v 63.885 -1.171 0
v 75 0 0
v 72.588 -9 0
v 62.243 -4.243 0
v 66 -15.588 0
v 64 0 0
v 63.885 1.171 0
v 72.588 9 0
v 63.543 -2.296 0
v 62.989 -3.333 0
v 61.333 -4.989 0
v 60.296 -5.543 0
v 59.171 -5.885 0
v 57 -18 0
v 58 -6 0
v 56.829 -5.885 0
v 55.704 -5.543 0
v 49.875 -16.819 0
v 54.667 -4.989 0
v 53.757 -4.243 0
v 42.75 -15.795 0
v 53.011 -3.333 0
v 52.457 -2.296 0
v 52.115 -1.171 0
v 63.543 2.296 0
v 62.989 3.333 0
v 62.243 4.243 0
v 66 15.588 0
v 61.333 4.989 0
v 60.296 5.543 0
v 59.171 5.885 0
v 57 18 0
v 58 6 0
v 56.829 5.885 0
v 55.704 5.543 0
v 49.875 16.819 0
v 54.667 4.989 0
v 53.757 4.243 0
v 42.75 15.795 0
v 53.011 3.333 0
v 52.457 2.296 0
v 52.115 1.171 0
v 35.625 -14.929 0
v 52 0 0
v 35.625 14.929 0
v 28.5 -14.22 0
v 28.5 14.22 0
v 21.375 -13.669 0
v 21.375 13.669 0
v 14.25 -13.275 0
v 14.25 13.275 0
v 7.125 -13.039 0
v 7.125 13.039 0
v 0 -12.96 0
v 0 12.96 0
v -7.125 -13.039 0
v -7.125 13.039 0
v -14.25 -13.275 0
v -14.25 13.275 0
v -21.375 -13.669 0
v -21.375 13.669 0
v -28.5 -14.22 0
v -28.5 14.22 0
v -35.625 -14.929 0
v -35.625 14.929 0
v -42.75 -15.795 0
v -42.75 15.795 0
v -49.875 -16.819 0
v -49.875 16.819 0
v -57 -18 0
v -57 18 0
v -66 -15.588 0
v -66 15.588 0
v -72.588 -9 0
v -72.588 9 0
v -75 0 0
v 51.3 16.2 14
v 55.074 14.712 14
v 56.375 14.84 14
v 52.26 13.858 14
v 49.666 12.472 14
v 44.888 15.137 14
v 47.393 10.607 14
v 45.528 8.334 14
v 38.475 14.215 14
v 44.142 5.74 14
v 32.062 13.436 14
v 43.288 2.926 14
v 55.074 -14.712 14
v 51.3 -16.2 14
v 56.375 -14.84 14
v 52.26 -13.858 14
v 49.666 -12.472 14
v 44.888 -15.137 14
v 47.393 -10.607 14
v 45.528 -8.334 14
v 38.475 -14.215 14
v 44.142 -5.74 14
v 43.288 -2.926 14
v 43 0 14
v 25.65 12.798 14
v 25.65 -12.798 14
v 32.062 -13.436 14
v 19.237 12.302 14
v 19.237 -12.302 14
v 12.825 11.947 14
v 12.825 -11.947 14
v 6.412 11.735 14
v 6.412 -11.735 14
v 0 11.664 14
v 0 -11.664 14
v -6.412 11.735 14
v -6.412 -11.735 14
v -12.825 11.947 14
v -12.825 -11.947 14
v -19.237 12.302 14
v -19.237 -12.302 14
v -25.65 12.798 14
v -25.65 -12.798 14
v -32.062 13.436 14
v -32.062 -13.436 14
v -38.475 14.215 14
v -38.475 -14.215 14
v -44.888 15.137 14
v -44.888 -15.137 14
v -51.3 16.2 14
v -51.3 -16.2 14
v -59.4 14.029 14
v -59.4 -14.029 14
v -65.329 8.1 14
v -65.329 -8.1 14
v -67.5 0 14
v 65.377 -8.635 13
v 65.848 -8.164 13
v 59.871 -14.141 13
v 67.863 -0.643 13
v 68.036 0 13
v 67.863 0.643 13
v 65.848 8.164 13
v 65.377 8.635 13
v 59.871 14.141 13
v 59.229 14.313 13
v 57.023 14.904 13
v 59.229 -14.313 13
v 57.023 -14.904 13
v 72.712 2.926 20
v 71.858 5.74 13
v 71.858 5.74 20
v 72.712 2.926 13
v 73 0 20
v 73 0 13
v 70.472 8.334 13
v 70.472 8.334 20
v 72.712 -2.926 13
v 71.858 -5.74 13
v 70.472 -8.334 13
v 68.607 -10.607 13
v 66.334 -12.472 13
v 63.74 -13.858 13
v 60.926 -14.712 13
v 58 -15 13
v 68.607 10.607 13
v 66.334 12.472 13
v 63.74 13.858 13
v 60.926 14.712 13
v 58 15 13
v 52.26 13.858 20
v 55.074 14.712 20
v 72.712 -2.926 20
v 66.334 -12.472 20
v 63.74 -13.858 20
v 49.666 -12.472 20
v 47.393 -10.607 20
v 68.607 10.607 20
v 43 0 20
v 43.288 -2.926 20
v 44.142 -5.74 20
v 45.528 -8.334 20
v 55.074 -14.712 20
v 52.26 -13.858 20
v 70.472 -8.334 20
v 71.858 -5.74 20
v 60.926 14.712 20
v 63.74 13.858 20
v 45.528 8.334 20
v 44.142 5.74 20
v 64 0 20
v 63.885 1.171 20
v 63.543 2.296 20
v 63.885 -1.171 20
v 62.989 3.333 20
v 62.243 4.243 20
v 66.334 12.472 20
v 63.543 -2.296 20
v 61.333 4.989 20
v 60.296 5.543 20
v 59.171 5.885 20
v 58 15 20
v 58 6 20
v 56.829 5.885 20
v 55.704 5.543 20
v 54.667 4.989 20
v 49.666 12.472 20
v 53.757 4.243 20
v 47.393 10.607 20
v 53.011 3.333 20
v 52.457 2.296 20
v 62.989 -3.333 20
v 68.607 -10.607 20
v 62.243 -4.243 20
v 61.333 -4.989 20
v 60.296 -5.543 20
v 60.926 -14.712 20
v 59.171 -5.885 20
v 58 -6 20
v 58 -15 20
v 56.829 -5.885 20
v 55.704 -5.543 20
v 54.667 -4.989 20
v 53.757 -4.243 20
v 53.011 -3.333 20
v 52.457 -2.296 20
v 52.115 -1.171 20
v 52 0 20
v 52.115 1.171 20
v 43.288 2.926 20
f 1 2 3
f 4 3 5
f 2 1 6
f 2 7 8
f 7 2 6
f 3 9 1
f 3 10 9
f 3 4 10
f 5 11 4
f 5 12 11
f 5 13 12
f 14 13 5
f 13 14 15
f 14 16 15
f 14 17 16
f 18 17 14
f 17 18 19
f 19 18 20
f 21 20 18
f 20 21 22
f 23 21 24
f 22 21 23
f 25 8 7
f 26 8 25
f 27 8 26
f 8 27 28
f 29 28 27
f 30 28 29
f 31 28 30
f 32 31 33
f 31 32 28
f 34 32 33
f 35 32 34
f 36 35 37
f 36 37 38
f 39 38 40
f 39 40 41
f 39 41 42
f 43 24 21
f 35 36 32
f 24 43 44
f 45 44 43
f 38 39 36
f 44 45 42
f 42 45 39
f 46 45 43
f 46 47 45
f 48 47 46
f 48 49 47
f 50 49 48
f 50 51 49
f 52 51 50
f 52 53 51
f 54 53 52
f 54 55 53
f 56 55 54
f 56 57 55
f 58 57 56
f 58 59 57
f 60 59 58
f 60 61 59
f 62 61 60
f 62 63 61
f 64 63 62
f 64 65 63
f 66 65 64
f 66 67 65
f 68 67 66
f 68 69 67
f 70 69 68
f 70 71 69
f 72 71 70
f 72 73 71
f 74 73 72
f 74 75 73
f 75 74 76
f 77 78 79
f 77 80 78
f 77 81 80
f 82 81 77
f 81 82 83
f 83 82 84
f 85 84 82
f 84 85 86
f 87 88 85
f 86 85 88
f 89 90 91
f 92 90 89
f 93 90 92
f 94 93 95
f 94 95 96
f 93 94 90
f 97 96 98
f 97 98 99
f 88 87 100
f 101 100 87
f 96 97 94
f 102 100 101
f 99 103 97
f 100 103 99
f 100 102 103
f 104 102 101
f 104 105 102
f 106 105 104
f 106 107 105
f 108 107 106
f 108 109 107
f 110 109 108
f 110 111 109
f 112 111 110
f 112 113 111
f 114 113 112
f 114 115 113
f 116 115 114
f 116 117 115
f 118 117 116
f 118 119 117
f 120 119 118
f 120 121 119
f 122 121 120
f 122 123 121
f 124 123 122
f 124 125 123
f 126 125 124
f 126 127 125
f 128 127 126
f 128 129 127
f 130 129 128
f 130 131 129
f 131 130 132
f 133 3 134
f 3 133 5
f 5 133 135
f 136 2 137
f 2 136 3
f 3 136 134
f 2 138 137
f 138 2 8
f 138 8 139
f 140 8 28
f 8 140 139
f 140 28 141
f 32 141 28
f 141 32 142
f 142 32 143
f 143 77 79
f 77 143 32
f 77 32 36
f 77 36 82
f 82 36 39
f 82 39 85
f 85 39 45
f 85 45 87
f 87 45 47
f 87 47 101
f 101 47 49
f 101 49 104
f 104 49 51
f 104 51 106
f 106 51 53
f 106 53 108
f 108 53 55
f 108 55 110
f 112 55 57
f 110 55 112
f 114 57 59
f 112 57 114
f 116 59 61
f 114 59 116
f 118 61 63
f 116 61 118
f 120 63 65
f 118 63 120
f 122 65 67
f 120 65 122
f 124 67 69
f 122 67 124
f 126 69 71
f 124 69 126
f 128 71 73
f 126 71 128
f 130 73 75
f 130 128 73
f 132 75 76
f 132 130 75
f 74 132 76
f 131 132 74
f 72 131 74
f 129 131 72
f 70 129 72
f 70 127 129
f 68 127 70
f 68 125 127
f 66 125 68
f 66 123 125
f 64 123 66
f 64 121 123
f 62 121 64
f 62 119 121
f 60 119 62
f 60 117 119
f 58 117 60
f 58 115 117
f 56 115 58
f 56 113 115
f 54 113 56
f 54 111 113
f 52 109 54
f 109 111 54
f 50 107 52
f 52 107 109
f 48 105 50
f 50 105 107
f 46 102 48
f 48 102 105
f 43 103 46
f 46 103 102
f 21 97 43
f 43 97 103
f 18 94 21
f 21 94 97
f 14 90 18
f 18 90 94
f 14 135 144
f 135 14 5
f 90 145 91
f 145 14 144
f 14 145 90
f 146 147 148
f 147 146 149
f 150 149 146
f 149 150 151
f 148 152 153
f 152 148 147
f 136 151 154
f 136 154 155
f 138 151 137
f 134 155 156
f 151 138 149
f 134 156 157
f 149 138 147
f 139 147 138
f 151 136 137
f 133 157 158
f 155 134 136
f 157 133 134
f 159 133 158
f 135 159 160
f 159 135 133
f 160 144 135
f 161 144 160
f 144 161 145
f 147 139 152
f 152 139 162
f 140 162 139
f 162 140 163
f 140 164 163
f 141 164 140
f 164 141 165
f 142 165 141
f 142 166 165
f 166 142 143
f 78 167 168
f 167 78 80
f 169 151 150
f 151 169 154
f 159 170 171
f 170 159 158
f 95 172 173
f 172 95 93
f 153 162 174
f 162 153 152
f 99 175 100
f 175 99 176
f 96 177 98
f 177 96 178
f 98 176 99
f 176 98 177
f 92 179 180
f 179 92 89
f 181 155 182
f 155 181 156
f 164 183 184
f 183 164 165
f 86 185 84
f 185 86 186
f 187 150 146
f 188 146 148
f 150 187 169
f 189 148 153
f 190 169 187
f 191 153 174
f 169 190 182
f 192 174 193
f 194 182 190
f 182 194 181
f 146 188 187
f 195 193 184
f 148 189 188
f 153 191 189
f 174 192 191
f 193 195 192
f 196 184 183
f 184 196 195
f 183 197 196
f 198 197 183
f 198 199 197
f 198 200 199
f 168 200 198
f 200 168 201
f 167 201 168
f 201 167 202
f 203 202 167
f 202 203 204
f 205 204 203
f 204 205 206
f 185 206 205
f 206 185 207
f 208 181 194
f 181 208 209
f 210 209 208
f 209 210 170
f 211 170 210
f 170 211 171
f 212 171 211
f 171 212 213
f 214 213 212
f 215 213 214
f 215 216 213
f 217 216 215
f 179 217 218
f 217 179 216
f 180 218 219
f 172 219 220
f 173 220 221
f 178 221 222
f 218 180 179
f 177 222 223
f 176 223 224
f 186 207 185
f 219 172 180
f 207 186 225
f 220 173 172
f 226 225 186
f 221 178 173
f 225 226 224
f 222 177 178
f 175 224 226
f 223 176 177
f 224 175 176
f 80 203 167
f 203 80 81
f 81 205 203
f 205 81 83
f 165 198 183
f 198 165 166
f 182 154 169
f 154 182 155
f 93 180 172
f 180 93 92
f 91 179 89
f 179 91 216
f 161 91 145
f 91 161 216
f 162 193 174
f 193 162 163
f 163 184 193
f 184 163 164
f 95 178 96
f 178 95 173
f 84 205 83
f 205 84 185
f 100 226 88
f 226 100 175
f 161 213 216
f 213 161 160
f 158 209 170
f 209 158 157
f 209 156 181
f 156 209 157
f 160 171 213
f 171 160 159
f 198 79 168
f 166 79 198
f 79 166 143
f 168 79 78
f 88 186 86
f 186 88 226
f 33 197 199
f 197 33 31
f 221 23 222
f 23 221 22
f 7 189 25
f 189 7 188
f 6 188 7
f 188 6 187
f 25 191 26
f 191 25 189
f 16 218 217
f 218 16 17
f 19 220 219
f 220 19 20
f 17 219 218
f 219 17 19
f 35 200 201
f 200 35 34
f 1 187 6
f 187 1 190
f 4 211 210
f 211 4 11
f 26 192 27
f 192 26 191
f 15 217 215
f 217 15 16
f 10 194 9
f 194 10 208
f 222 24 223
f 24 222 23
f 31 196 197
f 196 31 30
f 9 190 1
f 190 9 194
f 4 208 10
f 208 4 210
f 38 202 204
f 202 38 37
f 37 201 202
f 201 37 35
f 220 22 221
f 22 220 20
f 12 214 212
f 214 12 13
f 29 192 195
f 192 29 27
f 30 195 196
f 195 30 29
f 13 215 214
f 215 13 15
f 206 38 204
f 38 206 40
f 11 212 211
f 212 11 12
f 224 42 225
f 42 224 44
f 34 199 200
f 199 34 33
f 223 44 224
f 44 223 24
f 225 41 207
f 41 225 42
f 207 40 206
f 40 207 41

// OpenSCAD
$fn = 32;

// ----------------------------------------------------------------------
// Handle: 150 x 36 mm grip, 14 mm thick
// ----------------------------------------------------------------------

// --- parameters (mm) ---
length = 150;             // grip length
width = 36;               // grip width
thickness = 14;           // grip thickness
waist = 0.72;             // width factor at the middle
draft = 0.9;              // top face scale of the extrusion
boss_d = 30;              // mounting boss diameter
boss_h = 6;               // mounting boss height
boss_hole_d = 12;         // screw clearance through the boss
boss_r = 58;              // boss centre from the grip centre

/* ergonomic grip outline, closed spline-like polygon in the XY plane */
grip = [[-57, 18], [-49.875, 16.819], [-42.75, 15.795], [-35.625, 14.929], [-28.5, 14.22], [-21.375, 13.669], [-14.25, 13.275], [-7.125, 13.039], [0, 12.96], [7.125, 13.039], [14.25, 13.275], [21.375, 13.669], [28.5, 14.22], [35.625, 14.929], [42.75, 15.795], [49.875, 16.819], [57, 18], [66, 15.588], [72.588, 9], [75, 0], [72.588, -9], [66, -15.588], [57, -18], [57, -18], [49.875, -16.819], [42.75, -15.795], [35.625, -14.929], [28.5, -14.22], [21.375, -13.669], [14.25, -13.275], [7.125, -13.039], [0, -12.96], [-7.125, -13.039], [-14.25, -13.275], [-21.375, -13.669], [-28.5, -14.22], [-35.625, -14.929], [-42.75, -15.795], [-49.875, -16.819], [-57, -18], [-66, -15.588], [-72.588, -9], [-75, 0], [-72.588, 9], [-66, 15.588], [-57, 18]];

module grip_body() {
  linear_extrude(height = thickness, scale = draft) polygon(grip);
}

module boss_body() {
  /* sunk 1 mm into the grip so the joint overlaps */
  translate([boss_r, 0, thickness - 1]) cylinder(h = boss_h + 1, d = boss_d);
}

difference() {
  union() {
    grip_body();
    boss_body();
  }
  translate([boss_r, 0, -1]) cylinder(h = thickness + boss_h + 2, d = boss_hole_d);
}
